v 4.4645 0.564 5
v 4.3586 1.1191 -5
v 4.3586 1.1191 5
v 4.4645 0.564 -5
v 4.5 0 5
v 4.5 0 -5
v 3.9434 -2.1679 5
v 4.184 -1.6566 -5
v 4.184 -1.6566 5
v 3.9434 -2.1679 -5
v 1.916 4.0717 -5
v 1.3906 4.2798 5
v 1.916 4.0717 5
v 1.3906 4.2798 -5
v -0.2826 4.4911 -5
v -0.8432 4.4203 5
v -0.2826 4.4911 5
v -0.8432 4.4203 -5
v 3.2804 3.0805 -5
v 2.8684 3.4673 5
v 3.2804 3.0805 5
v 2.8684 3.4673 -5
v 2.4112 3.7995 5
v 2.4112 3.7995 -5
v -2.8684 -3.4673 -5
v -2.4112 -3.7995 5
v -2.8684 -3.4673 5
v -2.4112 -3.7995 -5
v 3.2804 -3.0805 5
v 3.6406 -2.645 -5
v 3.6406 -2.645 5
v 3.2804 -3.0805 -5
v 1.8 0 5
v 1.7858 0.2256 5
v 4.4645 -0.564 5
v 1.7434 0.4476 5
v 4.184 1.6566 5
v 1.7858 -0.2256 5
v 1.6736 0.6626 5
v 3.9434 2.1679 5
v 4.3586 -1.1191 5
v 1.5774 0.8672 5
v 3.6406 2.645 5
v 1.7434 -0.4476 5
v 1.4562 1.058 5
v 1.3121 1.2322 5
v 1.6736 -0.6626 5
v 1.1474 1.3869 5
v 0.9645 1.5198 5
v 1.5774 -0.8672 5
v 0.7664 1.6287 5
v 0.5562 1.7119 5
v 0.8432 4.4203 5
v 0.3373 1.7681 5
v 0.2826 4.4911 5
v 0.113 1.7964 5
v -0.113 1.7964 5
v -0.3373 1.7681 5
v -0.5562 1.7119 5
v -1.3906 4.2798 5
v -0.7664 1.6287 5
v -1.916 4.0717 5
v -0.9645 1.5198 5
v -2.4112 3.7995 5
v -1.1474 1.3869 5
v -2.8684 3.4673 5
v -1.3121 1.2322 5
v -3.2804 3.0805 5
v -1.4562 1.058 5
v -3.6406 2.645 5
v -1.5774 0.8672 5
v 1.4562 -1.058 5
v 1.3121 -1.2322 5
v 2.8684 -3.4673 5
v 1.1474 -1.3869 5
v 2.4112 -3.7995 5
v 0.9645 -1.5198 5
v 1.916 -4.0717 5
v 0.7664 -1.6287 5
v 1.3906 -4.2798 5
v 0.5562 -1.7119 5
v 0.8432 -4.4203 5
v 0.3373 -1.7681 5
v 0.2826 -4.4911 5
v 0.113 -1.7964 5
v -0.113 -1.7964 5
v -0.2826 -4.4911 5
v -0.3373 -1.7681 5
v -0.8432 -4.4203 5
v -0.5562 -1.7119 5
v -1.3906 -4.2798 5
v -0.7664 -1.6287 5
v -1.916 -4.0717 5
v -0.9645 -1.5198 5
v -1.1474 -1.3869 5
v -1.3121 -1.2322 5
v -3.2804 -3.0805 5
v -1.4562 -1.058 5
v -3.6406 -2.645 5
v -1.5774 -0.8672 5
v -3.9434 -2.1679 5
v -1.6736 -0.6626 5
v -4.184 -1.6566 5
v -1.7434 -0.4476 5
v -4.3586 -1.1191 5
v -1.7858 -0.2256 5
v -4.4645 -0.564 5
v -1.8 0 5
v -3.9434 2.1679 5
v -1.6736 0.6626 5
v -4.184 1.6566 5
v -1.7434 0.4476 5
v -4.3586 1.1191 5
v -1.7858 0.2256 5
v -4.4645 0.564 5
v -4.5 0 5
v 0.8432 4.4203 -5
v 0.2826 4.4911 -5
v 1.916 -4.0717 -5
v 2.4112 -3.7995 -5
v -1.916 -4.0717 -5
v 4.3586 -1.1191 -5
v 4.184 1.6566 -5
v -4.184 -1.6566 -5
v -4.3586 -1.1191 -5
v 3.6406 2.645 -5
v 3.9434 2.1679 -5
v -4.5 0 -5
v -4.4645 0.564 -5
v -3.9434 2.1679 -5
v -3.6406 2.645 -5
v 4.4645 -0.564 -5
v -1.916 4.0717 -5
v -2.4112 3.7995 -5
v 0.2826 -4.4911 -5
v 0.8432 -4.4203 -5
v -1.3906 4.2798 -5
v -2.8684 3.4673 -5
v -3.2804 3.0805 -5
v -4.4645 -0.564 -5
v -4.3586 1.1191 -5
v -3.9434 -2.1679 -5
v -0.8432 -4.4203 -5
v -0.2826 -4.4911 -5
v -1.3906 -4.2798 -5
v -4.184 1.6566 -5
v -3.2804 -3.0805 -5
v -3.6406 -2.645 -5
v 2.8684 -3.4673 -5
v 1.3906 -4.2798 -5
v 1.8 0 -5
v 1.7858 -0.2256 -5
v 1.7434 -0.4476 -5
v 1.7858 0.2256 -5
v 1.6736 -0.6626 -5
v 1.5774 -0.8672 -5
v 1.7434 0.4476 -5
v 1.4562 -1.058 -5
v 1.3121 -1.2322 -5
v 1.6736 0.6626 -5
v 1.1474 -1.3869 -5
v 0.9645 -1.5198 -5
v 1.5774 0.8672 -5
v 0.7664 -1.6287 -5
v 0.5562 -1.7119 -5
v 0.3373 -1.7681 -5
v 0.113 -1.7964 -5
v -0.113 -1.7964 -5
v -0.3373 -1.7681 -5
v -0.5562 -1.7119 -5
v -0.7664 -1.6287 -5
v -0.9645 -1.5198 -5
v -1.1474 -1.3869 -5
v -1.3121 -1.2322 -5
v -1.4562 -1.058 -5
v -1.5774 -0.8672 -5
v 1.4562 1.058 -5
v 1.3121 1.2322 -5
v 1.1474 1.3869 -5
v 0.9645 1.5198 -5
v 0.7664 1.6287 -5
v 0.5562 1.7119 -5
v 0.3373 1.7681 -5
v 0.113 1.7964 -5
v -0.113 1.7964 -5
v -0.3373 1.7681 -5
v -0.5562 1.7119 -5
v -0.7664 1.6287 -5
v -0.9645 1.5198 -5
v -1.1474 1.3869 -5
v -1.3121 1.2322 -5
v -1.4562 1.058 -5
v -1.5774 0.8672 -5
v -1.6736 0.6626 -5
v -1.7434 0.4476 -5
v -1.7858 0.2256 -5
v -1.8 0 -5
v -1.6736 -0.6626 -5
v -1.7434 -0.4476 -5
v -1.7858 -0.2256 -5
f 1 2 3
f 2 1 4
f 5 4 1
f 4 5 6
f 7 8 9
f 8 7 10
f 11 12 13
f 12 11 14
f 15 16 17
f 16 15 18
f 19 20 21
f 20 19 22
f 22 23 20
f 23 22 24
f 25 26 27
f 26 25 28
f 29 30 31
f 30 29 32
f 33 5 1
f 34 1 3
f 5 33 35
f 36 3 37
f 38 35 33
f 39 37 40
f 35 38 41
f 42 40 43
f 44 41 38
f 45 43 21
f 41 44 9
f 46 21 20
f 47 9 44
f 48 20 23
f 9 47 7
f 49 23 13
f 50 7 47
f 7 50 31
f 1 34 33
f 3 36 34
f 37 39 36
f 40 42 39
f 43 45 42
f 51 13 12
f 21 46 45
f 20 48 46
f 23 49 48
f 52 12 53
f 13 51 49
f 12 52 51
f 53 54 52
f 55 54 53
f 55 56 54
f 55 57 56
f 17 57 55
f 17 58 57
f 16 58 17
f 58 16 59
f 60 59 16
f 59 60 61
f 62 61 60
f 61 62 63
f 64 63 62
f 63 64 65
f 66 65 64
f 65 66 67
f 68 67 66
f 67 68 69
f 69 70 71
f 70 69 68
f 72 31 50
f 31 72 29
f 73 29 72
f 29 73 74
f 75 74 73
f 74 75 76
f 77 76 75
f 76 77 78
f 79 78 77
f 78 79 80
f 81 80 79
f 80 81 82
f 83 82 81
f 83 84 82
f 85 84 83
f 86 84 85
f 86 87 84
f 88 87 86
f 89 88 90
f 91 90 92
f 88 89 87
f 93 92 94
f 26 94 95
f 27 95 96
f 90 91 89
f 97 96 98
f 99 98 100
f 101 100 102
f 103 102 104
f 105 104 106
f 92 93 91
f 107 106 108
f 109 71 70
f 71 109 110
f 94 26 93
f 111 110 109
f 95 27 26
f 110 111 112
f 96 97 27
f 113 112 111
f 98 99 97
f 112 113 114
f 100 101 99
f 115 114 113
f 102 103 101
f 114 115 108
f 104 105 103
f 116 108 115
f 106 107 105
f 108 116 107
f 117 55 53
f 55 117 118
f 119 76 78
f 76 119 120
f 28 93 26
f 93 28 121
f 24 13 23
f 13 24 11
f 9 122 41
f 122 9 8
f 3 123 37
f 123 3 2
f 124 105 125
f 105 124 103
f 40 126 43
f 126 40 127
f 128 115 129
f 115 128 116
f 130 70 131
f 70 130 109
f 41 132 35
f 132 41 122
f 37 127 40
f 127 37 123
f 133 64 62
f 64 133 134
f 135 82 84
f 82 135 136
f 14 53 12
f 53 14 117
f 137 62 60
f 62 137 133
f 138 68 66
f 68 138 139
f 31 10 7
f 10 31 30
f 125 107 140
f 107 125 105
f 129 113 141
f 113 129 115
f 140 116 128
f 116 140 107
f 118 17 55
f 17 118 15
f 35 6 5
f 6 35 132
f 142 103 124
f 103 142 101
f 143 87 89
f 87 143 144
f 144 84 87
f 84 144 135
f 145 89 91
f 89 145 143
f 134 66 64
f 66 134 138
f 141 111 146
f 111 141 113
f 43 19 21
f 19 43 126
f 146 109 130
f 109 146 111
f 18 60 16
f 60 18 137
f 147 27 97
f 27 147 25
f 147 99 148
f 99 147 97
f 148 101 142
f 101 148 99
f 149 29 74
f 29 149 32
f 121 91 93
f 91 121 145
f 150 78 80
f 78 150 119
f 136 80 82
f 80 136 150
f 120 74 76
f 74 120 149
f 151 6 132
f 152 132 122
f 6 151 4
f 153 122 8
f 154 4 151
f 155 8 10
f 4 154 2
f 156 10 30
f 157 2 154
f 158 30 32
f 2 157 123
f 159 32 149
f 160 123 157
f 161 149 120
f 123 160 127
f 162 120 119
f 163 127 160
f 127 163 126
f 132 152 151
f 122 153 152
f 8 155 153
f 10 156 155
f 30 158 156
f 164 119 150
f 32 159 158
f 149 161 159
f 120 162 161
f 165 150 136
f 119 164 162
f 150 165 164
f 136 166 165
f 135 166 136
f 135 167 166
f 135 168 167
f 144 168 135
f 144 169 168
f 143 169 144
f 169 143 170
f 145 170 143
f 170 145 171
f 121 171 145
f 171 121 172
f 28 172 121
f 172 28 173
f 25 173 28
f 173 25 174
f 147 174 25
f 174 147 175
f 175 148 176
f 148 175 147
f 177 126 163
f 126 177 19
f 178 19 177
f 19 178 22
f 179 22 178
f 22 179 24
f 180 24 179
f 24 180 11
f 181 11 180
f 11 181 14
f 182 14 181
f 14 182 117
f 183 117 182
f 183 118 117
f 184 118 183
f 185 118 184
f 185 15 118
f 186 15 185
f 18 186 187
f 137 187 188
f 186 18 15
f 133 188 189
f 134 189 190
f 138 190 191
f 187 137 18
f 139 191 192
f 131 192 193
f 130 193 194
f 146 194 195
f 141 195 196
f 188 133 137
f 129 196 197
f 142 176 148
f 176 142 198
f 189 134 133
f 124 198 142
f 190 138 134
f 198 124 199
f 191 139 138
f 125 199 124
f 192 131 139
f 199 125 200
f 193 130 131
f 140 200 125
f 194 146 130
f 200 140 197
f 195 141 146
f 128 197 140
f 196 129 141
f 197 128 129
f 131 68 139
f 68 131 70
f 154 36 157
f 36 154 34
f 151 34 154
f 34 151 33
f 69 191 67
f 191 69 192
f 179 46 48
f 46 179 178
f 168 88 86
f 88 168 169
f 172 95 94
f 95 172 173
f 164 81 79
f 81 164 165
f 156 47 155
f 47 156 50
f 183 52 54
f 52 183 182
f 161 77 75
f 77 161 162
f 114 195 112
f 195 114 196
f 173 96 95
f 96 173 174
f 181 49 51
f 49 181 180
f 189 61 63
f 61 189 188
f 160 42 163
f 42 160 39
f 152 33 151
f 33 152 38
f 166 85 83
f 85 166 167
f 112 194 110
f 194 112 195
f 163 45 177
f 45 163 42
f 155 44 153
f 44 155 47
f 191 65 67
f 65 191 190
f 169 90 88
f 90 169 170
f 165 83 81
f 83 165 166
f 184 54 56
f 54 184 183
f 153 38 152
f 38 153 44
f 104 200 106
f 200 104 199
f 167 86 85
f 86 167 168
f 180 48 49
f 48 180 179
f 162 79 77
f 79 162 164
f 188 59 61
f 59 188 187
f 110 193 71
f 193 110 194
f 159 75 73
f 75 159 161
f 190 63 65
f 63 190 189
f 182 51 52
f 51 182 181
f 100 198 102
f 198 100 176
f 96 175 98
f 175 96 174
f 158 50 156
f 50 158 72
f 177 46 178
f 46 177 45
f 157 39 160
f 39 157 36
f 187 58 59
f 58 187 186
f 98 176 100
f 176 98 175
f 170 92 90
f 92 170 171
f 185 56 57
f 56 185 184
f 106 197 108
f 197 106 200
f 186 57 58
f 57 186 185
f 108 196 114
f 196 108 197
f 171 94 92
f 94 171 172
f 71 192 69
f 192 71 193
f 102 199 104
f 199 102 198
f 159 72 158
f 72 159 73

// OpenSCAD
$fn = 50;


difference() {
	union() {
		translate(v = [0, 0, -5.0000000000]) {
			cylinder(h = 10, r = 4.5000000000);
		}
	}
	union() {
		#translate(v = [0, 0, -100.0000000000]) {
			cylinder(h = 200, r = 1.8000000000);
		}
	}
}
